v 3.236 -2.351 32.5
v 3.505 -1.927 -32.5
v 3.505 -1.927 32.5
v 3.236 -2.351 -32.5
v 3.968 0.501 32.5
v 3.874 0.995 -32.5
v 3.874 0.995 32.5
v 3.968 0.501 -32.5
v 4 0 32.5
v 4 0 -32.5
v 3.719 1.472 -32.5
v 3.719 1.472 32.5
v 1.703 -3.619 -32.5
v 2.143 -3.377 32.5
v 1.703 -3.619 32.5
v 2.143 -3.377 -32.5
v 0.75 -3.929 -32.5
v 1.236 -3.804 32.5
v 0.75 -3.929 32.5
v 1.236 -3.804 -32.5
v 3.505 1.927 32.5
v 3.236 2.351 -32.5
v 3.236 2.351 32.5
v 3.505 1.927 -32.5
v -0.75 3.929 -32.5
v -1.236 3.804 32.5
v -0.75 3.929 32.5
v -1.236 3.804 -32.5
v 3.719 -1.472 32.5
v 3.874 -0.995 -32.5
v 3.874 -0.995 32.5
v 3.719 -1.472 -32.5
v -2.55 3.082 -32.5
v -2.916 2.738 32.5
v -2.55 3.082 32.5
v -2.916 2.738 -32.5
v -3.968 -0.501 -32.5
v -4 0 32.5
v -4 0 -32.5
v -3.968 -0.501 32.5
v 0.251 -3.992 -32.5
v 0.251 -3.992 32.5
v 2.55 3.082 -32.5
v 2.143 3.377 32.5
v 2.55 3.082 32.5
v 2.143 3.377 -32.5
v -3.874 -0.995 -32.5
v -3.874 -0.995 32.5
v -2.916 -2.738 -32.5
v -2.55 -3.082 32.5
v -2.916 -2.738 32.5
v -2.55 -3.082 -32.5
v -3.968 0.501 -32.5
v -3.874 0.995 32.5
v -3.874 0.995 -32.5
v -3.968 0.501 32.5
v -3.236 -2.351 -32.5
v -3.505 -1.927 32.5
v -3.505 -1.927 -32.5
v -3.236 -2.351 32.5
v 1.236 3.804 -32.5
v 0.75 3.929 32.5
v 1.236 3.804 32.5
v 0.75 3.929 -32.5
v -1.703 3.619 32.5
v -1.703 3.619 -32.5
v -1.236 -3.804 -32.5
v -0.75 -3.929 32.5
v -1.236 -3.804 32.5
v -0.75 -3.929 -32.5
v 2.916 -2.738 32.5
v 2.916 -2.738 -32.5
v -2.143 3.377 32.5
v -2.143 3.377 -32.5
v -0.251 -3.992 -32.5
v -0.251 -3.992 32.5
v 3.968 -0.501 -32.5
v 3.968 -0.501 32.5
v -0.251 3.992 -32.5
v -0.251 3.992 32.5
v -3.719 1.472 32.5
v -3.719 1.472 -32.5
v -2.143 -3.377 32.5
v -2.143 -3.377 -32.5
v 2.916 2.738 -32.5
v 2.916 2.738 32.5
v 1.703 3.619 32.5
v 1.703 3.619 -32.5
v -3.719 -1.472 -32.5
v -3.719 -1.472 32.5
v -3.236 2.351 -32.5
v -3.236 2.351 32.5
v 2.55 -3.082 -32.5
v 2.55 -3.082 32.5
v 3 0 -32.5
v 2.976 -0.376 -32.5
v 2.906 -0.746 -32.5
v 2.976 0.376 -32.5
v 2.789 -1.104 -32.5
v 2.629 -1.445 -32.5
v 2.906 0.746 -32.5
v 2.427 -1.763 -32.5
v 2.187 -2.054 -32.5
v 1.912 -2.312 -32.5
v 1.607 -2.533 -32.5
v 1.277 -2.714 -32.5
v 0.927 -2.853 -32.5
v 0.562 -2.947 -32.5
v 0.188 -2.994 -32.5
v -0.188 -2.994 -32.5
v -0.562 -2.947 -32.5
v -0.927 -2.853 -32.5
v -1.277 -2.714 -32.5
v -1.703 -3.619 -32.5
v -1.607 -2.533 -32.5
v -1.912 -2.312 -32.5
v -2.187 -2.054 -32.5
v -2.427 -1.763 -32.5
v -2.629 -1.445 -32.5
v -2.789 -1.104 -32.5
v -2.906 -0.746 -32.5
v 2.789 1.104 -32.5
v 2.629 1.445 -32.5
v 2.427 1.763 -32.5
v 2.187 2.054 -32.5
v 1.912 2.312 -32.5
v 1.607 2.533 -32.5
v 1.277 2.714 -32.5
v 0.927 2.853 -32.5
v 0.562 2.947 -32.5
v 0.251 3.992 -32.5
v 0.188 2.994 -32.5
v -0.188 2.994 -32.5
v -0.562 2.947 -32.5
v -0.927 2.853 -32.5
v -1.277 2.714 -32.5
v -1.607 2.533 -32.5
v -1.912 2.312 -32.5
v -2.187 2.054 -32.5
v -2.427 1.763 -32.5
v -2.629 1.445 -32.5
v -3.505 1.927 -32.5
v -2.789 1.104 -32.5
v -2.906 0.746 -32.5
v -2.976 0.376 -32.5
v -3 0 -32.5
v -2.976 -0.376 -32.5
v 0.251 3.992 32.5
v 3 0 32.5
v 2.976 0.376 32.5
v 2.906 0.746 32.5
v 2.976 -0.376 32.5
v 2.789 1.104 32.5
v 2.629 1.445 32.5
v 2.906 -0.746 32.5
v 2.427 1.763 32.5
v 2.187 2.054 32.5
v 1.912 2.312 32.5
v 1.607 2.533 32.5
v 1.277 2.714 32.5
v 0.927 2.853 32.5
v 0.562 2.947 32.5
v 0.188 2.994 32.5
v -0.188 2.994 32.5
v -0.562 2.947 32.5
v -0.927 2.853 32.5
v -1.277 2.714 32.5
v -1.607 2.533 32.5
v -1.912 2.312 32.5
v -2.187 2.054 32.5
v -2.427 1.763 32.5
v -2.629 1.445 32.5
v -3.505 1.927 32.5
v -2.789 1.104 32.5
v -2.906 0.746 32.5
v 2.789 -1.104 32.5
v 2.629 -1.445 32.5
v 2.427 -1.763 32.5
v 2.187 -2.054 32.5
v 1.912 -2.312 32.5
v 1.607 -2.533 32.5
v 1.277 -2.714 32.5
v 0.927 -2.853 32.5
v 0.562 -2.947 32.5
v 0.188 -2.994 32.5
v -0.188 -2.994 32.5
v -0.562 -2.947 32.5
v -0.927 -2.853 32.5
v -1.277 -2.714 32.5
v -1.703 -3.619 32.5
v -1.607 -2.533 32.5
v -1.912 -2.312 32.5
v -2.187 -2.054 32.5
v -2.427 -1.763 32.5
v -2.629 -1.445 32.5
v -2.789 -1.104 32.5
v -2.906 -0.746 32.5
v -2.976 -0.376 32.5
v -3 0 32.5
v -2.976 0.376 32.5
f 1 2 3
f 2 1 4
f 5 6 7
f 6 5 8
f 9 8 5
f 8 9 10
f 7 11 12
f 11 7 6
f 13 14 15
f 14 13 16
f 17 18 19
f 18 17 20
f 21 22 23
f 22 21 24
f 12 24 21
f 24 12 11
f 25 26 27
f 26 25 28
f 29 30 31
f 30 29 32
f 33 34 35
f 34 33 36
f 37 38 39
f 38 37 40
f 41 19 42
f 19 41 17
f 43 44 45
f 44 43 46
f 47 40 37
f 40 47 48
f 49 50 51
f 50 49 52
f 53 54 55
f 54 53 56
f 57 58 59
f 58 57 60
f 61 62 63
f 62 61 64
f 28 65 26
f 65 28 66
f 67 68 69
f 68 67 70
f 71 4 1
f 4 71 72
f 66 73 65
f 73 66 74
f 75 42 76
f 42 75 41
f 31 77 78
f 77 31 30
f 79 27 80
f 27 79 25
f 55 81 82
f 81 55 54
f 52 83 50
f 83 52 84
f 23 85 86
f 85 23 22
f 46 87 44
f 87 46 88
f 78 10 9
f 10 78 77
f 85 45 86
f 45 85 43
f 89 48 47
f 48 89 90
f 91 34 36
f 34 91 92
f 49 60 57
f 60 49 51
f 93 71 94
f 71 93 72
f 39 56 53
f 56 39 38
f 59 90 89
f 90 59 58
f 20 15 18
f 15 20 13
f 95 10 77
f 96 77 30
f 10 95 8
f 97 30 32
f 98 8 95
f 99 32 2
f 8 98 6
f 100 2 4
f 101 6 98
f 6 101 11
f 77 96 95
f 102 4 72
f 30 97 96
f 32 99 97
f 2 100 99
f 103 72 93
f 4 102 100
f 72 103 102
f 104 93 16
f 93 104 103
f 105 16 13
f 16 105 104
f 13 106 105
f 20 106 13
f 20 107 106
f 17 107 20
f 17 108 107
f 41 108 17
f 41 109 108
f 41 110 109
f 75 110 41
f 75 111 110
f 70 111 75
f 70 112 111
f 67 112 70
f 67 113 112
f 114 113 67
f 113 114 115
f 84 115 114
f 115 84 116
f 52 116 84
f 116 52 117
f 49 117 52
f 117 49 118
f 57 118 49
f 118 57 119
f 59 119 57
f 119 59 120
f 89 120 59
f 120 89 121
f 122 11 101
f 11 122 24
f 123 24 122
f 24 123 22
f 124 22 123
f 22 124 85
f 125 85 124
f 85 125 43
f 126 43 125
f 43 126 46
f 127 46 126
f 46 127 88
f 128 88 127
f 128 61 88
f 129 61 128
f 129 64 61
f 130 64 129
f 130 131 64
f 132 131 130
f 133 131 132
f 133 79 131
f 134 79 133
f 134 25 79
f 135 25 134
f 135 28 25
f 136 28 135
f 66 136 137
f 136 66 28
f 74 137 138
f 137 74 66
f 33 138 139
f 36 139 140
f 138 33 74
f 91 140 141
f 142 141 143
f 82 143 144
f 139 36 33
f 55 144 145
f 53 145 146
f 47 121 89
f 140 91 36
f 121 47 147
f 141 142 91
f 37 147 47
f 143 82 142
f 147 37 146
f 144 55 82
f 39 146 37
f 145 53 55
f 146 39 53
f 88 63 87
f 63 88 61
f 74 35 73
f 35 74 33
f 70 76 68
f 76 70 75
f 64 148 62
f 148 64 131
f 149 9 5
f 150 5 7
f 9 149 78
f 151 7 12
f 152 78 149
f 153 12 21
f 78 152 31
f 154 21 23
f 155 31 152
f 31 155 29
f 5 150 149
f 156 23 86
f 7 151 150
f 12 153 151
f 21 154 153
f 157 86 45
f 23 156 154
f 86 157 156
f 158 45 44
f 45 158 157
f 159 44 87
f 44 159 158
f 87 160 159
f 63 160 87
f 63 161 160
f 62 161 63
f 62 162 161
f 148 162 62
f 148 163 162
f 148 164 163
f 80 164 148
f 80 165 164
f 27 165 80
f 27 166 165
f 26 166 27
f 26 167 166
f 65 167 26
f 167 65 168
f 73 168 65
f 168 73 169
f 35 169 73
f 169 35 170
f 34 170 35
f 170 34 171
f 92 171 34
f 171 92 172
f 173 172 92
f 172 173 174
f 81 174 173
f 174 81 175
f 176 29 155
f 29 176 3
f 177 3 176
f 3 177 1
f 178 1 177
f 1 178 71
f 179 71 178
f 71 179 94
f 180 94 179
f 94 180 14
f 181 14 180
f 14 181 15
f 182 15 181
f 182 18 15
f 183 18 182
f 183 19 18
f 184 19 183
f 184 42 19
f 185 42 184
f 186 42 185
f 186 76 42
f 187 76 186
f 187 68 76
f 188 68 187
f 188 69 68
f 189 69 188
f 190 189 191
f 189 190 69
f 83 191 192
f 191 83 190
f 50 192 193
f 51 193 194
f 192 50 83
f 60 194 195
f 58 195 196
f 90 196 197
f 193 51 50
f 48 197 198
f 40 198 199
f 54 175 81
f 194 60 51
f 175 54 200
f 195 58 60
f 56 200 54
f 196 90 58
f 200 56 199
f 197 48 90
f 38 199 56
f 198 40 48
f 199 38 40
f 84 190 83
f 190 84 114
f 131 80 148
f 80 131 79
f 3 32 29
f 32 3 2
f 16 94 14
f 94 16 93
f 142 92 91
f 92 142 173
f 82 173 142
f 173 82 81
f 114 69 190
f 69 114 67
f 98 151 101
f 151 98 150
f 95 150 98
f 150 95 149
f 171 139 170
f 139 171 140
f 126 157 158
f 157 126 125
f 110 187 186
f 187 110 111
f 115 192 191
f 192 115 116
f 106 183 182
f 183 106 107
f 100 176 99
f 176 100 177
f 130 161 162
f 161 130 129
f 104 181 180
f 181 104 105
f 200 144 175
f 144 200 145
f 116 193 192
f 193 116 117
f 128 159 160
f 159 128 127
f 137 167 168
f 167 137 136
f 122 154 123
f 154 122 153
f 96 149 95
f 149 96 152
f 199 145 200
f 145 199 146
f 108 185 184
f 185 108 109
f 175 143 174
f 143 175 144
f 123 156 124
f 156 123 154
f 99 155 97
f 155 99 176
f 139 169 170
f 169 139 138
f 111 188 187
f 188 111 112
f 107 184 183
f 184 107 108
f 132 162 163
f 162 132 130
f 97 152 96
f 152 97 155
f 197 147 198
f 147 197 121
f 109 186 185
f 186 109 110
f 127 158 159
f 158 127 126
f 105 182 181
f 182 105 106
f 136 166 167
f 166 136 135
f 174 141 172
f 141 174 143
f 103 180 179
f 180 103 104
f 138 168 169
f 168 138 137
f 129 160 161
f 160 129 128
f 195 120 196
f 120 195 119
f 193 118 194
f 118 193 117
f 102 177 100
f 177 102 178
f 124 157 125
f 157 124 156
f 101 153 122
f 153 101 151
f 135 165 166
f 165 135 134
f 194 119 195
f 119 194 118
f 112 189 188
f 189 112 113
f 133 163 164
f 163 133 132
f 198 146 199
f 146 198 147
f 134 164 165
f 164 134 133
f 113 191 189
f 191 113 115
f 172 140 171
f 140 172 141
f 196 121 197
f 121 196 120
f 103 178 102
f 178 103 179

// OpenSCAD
$fn = 50;


difference() {
	union() {
		translate(v = [0, 0, -32.5000000000]) {
			cylinder(h = 65, r = 4.0000000000);
		}
	}
	union() {
		translate(v = [0, 0, -100.0000000000]) {
			cylinder(h = 200, r = 3.0000000000);
		}
	}
}
